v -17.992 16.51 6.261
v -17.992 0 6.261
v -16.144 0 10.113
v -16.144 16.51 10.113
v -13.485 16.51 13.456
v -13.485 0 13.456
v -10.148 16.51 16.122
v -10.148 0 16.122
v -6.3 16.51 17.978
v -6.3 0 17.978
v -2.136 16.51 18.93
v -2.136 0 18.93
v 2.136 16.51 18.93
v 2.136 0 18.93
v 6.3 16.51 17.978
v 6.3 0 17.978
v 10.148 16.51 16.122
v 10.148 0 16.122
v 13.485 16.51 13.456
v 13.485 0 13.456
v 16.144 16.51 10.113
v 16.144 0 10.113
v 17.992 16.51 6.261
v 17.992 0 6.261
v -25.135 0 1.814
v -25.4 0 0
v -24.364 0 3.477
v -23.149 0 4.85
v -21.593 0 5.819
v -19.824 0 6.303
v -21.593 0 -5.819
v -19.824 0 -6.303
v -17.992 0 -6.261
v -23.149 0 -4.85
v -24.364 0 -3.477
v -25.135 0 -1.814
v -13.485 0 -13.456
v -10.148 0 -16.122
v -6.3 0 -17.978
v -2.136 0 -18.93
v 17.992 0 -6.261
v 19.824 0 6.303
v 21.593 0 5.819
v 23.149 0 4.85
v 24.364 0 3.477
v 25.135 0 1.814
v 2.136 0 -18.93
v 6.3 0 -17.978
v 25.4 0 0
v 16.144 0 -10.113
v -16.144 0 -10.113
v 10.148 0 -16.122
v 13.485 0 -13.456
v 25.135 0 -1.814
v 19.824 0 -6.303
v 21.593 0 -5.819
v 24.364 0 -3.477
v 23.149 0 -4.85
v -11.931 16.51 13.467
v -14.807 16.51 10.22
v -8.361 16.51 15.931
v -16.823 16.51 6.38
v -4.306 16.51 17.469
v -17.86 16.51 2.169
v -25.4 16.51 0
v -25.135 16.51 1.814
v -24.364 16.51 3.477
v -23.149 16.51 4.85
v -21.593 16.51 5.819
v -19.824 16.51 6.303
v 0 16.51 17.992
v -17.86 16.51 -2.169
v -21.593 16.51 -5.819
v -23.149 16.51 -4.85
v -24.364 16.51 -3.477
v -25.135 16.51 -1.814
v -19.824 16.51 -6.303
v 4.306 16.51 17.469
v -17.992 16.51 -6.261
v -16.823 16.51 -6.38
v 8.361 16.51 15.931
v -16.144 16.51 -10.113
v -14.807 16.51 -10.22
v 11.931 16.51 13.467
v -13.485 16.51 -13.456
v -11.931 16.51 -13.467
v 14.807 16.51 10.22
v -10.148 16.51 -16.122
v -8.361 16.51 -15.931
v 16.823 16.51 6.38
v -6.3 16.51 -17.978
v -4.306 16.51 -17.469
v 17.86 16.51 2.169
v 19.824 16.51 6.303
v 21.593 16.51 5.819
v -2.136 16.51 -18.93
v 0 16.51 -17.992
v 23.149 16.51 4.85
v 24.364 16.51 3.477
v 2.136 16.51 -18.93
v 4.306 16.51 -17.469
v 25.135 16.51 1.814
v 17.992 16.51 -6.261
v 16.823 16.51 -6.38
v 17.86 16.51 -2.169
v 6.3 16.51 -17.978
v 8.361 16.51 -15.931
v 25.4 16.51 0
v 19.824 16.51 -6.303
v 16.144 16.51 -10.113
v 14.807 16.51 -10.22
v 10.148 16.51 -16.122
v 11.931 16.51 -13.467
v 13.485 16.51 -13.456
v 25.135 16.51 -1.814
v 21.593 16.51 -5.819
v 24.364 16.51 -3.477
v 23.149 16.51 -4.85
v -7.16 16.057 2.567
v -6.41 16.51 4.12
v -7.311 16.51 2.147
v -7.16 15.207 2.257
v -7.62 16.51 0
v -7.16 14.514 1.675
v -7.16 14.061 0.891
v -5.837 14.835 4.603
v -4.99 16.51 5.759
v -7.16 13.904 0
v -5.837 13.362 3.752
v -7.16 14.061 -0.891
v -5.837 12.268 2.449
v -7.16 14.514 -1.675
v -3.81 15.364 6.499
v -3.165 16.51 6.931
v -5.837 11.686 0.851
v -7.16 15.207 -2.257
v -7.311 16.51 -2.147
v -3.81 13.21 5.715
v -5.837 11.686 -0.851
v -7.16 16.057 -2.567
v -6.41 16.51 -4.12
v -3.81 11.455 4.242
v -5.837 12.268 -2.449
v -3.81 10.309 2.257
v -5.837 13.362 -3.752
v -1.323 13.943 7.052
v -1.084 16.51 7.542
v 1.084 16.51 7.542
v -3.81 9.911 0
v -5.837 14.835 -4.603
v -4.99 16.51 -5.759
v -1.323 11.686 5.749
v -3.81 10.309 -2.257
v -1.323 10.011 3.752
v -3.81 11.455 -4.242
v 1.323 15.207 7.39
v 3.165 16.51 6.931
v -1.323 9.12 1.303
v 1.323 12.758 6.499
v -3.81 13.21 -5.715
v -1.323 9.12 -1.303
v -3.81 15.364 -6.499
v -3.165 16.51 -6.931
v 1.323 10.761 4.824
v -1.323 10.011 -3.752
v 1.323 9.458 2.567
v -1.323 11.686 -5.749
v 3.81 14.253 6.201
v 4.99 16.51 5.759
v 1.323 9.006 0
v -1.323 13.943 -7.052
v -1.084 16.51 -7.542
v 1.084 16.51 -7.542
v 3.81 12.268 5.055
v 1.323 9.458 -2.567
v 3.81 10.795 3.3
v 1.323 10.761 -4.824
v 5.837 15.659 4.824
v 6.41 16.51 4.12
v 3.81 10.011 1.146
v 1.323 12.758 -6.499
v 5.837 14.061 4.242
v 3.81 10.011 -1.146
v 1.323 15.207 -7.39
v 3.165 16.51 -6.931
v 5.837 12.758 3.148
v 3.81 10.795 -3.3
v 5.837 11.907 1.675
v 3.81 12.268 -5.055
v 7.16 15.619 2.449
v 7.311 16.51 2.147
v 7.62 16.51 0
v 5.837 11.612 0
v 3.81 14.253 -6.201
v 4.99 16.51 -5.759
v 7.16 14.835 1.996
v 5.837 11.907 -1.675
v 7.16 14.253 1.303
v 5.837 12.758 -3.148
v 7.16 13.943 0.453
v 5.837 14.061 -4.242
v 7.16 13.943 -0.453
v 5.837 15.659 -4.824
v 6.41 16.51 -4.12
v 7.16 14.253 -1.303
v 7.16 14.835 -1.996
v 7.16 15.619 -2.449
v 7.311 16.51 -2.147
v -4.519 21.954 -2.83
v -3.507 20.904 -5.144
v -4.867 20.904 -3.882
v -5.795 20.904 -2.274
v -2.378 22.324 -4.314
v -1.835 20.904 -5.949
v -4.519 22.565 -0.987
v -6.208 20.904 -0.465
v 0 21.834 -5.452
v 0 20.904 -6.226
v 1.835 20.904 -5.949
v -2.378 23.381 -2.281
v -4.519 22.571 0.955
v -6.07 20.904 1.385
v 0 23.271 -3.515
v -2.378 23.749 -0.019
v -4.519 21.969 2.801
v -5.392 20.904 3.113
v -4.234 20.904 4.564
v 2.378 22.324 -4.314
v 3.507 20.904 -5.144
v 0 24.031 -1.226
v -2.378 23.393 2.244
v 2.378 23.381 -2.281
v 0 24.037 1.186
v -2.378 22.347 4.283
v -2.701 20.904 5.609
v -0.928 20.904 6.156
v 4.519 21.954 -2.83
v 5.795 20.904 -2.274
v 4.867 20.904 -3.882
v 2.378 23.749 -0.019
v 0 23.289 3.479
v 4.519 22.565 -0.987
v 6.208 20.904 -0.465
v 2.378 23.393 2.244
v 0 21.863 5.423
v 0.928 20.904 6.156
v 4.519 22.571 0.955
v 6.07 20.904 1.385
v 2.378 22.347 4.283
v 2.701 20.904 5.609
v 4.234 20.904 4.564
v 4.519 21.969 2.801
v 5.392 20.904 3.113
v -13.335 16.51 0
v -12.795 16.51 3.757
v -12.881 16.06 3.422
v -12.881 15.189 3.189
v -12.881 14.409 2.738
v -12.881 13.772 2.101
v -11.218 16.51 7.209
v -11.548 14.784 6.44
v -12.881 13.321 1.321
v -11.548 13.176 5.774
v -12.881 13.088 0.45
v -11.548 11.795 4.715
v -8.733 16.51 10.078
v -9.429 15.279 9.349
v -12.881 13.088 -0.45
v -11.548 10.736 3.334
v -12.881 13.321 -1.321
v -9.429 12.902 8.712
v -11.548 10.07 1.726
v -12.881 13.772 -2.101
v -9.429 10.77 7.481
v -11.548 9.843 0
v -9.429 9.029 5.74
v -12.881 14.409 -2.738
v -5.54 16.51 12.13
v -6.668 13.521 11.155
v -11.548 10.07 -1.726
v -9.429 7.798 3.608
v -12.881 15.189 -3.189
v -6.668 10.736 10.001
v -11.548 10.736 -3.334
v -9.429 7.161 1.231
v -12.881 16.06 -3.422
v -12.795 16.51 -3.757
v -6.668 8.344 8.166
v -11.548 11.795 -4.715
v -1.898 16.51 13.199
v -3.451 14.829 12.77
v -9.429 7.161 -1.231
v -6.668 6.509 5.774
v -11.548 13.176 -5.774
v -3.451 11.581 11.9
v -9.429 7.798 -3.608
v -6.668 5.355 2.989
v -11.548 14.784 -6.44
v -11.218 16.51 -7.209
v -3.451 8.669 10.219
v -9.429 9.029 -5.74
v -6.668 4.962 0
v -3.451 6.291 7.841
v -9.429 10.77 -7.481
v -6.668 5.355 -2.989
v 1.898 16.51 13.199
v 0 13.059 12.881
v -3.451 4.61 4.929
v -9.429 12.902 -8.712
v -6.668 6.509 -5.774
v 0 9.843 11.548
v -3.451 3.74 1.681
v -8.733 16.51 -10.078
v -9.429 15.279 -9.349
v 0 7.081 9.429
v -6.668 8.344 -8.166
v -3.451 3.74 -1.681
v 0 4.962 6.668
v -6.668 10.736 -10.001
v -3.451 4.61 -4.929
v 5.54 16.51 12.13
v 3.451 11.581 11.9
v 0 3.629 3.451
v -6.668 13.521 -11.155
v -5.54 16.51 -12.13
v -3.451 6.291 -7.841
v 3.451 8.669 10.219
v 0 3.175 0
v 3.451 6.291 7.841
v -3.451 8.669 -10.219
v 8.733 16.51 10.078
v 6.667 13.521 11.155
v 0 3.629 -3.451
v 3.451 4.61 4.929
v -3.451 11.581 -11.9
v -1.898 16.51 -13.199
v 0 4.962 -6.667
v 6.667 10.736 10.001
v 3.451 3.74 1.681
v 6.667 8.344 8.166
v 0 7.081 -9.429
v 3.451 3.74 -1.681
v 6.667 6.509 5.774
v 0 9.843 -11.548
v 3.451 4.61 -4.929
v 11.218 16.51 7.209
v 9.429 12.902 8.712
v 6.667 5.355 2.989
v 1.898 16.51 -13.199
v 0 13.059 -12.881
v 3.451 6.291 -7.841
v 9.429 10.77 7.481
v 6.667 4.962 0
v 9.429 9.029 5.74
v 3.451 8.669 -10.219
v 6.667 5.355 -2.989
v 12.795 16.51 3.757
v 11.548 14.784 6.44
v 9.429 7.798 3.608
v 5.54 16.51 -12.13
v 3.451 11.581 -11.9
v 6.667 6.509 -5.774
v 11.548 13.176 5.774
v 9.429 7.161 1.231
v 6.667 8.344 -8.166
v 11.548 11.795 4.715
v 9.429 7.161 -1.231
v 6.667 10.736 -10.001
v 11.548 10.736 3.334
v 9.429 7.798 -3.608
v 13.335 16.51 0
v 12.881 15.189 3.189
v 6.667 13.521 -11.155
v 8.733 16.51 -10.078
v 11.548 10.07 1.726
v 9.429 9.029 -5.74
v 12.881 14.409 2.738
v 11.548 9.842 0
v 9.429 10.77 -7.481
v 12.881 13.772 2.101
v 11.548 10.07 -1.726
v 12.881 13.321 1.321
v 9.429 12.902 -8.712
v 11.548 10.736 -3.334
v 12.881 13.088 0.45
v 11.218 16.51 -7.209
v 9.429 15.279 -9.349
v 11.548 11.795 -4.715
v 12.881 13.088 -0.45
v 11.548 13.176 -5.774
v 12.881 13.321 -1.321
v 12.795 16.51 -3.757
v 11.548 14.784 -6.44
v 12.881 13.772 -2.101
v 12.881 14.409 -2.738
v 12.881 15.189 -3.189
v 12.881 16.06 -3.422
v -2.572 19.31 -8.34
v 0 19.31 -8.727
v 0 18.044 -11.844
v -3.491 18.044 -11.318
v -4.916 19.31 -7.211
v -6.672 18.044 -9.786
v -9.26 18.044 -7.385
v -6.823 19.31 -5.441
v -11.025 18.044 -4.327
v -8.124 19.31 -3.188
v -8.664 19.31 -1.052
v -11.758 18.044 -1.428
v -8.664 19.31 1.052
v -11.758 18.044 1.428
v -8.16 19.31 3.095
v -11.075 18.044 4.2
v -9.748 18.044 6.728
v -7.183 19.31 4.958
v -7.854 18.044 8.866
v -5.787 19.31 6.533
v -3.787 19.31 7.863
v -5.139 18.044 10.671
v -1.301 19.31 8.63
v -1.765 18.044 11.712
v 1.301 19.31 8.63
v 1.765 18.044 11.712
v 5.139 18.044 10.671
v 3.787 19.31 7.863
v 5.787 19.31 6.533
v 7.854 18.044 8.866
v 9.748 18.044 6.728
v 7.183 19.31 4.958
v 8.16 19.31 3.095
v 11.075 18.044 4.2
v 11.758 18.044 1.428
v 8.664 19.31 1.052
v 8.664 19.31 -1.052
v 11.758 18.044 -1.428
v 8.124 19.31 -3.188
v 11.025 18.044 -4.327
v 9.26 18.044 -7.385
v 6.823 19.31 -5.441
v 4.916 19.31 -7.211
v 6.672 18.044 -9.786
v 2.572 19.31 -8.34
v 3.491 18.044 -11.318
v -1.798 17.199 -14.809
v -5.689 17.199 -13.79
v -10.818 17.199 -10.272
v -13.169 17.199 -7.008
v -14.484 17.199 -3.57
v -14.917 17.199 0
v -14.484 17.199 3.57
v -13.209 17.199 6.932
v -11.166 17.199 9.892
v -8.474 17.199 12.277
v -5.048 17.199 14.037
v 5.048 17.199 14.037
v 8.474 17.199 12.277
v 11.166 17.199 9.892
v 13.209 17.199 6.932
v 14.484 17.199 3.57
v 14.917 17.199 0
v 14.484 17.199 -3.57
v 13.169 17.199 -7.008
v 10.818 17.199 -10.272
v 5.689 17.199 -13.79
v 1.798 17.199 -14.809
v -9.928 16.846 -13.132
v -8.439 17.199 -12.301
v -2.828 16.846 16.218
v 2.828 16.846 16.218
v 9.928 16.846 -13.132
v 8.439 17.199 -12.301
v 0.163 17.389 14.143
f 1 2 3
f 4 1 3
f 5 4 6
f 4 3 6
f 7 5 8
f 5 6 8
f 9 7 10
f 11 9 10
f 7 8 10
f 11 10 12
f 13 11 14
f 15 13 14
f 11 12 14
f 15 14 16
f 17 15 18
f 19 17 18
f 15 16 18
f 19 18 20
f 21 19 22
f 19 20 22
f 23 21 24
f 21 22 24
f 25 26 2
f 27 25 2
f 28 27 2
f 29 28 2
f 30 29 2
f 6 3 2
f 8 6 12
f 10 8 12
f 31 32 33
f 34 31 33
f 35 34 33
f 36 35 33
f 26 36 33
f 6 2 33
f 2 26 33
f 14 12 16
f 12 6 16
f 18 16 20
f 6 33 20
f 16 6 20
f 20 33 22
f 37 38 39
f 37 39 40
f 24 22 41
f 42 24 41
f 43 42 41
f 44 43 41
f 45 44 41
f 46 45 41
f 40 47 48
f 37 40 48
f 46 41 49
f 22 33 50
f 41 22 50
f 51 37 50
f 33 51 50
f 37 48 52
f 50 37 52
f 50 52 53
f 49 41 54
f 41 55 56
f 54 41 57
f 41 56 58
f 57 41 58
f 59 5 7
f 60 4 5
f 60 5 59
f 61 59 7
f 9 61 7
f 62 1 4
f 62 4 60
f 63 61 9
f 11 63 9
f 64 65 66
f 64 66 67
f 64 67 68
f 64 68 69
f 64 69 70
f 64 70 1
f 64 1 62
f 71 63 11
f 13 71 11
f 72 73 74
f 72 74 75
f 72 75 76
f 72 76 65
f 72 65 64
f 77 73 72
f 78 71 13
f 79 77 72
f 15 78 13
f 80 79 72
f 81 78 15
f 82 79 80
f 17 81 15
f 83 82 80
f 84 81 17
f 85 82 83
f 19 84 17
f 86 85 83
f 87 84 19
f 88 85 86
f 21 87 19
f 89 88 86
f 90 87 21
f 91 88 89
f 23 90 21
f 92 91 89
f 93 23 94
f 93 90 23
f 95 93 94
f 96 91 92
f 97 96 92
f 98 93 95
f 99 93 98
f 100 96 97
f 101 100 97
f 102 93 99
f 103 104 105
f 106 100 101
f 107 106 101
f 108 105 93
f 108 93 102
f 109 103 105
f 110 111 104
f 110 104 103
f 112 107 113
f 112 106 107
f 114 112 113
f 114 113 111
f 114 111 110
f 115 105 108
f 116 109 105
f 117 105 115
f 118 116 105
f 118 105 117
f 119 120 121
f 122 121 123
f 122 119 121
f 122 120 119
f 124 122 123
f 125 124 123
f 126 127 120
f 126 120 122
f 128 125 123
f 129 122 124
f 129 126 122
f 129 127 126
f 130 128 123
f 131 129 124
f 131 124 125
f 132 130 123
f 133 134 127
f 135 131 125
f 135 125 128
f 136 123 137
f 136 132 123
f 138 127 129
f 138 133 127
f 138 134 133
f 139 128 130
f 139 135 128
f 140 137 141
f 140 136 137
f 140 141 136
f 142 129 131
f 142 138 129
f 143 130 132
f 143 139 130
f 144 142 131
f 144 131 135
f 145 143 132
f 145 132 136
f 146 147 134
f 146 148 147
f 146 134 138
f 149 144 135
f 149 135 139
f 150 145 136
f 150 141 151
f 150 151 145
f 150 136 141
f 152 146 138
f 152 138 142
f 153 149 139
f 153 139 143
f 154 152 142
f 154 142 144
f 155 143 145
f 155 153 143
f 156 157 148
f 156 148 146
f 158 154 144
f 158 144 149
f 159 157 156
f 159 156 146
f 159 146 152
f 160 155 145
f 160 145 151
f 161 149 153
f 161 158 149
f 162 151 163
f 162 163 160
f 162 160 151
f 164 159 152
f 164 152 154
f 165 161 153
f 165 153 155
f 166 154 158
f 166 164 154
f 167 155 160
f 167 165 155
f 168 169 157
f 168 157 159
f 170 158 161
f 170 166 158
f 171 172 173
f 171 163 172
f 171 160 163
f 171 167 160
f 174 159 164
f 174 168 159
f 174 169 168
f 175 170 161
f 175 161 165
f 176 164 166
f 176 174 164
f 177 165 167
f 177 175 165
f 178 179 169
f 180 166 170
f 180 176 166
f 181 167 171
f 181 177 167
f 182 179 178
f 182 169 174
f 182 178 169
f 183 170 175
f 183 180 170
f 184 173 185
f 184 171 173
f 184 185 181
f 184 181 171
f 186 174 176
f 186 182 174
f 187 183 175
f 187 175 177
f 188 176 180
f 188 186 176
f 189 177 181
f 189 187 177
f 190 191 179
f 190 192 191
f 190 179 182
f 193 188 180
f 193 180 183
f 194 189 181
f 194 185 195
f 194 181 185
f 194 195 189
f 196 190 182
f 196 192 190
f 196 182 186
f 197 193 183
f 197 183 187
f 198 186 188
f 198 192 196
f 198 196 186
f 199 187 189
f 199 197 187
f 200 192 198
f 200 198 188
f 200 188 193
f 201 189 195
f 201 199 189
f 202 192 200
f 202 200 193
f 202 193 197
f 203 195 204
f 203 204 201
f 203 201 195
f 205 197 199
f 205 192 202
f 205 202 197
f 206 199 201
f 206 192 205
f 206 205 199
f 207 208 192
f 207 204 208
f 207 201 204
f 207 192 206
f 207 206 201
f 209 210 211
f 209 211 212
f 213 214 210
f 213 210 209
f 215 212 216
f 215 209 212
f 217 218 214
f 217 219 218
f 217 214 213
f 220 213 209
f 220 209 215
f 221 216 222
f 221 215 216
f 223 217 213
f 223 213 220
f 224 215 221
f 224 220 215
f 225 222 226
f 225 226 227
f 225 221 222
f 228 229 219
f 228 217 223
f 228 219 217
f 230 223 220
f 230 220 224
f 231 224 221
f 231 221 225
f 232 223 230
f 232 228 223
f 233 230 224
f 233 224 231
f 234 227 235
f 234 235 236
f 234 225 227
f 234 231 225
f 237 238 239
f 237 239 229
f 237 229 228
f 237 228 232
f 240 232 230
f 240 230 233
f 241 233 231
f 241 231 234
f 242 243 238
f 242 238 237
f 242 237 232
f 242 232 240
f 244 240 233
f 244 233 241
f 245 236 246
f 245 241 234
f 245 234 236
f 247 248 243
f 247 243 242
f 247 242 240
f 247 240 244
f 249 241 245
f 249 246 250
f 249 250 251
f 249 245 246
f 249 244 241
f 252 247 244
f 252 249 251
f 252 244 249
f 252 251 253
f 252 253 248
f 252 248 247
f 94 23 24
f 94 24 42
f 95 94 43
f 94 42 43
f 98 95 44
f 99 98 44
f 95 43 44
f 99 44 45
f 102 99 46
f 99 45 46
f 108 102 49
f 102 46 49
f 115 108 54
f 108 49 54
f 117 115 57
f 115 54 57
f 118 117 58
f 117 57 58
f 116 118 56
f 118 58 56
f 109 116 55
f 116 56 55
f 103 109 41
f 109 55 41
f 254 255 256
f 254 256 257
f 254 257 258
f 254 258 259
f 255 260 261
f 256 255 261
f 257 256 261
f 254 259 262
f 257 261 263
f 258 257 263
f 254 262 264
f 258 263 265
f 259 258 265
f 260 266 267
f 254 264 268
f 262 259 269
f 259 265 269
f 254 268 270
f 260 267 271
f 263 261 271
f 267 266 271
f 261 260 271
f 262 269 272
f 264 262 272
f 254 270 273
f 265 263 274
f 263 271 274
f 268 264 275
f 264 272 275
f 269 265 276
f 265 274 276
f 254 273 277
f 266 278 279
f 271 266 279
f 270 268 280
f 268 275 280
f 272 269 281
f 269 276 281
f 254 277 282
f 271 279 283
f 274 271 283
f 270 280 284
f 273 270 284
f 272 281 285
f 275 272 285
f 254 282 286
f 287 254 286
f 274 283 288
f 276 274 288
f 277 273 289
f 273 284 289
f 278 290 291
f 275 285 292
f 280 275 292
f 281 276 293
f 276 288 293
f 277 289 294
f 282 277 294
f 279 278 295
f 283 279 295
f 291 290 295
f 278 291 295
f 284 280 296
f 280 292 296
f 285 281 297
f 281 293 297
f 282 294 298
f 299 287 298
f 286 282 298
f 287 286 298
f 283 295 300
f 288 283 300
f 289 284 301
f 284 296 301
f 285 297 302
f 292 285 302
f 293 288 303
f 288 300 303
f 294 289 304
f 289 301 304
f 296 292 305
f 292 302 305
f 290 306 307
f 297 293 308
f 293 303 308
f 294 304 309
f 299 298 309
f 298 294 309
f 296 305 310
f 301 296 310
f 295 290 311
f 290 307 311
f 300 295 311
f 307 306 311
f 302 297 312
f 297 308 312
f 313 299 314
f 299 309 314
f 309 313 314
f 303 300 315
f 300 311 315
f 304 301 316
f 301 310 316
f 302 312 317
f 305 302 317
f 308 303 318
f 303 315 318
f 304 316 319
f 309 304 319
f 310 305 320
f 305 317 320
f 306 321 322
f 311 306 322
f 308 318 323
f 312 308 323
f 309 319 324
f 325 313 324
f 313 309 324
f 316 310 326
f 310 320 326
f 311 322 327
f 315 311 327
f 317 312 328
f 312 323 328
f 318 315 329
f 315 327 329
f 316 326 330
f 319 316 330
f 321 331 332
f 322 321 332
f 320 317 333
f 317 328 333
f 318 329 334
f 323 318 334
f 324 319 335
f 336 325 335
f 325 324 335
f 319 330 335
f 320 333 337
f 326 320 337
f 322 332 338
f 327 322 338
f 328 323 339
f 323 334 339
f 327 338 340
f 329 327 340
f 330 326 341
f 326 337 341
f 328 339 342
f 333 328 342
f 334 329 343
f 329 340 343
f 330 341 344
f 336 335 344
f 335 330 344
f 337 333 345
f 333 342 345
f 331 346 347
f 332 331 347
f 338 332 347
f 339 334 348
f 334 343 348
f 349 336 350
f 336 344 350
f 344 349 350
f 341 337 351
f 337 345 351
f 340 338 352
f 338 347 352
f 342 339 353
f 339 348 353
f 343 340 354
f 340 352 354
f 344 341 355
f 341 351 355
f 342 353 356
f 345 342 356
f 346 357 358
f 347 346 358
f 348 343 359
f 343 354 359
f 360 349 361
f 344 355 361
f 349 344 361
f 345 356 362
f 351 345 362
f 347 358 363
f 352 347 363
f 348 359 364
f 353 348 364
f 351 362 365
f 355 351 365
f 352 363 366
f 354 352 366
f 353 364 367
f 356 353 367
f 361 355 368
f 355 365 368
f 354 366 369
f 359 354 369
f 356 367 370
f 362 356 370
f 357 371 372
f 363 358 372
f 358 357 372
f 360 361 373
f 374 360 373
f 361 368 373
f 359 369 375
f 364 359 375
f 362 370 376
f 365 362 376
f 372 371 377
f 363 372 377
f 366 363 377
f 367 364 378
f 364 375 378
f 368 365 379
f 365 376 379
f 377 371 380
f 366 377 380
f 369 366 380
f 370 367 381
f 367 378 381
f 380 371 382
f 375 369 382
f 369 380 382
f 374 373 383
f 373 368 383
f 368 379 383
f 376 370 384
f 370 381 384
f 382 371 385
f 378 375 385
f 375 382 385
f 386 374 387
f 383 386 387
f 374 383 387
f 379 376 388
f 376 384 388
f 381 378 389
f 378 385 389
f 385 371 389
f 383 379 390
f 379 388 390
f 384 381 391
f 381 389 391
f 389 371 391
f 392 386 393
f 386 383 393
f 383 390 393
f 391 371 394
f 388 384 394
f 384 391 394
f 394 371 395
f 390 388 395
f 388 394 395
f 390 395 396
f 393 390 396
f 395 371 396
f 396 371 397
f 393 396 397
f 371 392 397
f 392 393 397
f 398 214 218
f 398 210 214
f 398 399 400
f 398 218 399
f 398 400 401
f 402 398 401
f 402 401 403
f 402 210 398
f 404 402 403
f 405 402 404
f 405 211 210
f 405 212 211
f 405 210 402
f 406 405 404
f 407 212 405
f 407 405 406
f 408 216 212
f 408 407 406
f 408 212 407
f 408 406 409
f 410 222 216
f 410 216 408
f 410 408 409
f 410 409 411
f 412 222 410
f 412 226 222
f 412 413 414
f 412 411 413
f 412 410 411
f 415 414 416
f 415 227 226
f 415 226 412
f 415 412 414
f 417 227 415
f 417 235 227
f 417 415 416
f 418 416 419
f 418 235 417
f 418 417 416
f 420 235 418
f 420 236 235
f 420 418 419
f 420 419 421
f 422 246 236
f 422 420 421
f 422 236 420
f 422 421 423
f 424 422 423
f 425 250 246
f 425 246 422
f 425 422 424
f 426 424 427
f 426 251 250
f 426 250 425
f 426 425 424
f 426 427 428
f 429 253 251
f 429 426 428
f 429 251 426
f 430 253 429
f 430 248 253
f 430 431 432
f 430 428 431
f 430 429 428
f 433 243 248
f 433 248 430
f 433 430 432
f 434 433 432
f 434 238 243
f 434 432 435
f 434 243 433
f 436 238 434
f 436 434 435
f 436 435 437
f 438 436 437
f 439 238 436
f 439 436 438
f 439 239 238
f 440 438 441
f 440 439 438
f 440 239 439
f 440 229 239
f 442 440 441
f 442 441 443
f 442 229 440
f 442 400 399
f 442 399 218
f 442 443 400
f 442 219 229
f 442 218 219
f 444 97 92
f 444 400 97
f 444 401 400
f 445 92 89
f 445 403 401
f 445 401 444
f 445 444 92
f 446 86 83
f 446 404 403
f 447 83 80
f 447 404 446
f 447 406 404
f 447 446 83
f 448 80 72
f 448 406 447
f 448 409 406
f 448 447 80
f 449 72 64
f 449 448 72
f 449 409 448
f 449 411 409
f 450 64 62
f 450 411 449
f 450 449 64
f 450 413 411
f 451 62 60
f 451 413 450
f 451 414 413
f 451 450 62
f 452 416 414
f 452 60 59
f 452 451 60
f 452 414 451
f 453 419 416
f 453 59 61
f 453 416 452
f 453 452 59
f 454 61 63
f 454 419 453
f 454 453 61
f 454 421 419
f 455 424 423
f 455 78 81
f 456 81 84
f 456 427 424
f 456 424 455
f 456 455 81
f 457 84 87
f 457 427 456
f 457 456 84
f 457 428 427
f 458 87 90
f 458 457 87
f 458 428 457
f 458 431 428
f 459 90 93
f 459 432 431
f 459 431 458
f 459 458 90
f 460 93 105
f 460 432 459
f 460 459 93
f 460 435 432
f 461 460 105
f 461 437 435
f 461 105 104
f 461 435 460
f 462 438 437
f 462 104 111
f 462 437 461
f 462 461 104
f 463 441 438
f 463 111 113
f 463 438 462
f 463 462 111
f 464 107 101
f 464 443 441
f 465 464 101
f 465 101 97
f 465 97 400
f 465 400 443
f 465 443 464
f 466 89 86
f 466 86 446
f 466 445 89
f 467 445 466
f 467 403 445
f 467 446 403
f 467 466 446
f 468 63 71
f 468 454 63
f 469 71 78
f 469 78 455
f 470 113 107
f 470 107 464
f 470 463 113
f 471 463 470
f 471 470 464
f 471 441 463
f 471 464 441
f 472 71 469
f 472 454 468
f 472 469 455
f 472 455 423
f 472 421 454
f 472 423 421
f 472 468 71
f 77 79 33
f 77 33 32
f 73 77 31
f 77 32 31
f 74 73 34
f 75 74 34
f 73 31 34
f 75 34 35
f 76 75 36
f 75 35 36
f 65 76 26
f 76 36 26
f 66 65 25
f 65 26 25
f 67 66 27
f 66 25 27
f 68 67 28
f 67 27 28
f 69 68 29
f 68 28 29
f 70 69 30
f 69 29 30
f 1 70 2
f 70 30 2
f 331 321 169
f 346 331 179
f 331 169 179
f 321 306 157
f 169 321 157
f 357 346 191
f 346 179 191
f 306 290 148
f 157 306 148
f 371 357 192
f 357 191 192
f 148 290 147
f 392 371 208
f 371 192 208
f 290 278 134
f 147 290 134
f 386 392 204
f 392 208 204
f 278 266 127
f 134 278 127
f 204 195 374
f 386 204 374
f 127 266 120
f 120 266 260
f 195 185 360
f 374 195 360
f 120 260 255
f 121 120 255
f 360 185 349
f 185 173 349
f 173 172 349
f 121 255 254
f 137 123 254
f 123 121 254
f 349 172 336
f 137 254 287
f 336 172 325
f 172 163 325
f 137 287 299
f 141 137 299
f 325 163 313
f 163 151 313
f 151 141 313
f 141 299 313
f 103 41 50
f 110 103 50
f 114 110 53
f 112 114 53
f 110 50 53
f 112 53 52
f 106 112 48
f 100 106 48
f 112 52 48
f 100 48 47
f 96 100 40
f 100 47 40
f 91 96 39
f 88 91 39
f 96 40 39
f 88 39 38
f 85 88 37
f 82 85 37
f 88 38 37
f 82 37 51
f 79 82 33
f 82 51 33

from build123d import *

# Parameters (mm, degrees)
BOSS_EXTRUDE1_DEPTH = 16.51


with BuildPart() as part:
    # Sketch1 → Boss-Extrude1 (new body)
    with BuildSketch(Plane(origin=(0, 0, 0), x_dir=(1, 0, 0), z_dir=(0, 1, 0))):
        with BuildLine():
            ThreePointArc((-17.991666667, -6.261184437), (0, -19.05), (17.991666667, -6.261184437))
            ThreePointArc((17.991666667, -6.261184437), (25.4, 0), (17.991666667, 6.261184437))
            ThreePointArc((17.991666667, 6.261184437), (0, 19.05), (-17.991666667, 6.261184437))
            ThreePointArc((-17.991666667, 6.261184437), (-25.4, 0), (-17.991666667, -6.261184437))
        make_face()
    extrude(amount=BOSS_EXTRUDE1_DEPTH)

    # Sketch2 → Cut-Revolve4 (revolve, cut)
    with BuildSketch(Plane(origin=(0, 16.51, 0), x_dir=(1, 0, 0), z_dir=(0, 1, 0))):
        with BuildLine():
            ThreePointArc((-13.335, 0), (0, -13.335), (13.335, 0))
            Line((13.335, 0), (-13.335, 0))
        make_face()
    revolve(axis=Axis((0, 16.51, 0), (1, 0, 0)), mode=Mode.SUBTRACT)



with BuildPart() as body_2:
    # Sketch2<7> → Revolve1 (revolve)
    with BuildSketch(Plane(origin=(0, 16.51, 0), x_dir=(1, 0, 0), z_dir=(0, 1, 0))):
        with BuildLine():
            Line((7.62, 0), (0, 0))
            Line((0, 0), (-7.62, 0))
            ThreePointArc((-7.62, 0), (0, -7.62), (7.62, 0))
        make_face()
    revolve(axis=Axis((0, 16.51, 0), (1, 0, 0)))


with BuildPart() as part_1:
    add(part.part)

    add(body_2.part)  # Revolve2 merges body 2
    # Sketch3 → Revolve2 (revolve)
    with BuildSketch(Plane.XY):
        with BuildLine():
            Line((-17.991666667, 16.51), (-7.62, 16.51))
            add(Edge.make_bspline(
                [(-6.225616872, 20.903870112), (-7.600669831, 18.930780111), (-7.62, 16.51)],
                knots=[0, 0, 0, 1, 1, 1], degree=2))
            add(Edge.make_bspline(
                [(-17.991666667, 16.51), (-13.949922169, 17.401477486), (-9.562250003, 18.24582827), (-6.225616872, 20.903870112)],
                knots=[0, 0, 0, 0, 1, 1, 1, 1], degree=3))
        make_face()
    revolve(axis=Axis((0, 16.51, 0), (0, 1, 0)))


solid = part_1.part
